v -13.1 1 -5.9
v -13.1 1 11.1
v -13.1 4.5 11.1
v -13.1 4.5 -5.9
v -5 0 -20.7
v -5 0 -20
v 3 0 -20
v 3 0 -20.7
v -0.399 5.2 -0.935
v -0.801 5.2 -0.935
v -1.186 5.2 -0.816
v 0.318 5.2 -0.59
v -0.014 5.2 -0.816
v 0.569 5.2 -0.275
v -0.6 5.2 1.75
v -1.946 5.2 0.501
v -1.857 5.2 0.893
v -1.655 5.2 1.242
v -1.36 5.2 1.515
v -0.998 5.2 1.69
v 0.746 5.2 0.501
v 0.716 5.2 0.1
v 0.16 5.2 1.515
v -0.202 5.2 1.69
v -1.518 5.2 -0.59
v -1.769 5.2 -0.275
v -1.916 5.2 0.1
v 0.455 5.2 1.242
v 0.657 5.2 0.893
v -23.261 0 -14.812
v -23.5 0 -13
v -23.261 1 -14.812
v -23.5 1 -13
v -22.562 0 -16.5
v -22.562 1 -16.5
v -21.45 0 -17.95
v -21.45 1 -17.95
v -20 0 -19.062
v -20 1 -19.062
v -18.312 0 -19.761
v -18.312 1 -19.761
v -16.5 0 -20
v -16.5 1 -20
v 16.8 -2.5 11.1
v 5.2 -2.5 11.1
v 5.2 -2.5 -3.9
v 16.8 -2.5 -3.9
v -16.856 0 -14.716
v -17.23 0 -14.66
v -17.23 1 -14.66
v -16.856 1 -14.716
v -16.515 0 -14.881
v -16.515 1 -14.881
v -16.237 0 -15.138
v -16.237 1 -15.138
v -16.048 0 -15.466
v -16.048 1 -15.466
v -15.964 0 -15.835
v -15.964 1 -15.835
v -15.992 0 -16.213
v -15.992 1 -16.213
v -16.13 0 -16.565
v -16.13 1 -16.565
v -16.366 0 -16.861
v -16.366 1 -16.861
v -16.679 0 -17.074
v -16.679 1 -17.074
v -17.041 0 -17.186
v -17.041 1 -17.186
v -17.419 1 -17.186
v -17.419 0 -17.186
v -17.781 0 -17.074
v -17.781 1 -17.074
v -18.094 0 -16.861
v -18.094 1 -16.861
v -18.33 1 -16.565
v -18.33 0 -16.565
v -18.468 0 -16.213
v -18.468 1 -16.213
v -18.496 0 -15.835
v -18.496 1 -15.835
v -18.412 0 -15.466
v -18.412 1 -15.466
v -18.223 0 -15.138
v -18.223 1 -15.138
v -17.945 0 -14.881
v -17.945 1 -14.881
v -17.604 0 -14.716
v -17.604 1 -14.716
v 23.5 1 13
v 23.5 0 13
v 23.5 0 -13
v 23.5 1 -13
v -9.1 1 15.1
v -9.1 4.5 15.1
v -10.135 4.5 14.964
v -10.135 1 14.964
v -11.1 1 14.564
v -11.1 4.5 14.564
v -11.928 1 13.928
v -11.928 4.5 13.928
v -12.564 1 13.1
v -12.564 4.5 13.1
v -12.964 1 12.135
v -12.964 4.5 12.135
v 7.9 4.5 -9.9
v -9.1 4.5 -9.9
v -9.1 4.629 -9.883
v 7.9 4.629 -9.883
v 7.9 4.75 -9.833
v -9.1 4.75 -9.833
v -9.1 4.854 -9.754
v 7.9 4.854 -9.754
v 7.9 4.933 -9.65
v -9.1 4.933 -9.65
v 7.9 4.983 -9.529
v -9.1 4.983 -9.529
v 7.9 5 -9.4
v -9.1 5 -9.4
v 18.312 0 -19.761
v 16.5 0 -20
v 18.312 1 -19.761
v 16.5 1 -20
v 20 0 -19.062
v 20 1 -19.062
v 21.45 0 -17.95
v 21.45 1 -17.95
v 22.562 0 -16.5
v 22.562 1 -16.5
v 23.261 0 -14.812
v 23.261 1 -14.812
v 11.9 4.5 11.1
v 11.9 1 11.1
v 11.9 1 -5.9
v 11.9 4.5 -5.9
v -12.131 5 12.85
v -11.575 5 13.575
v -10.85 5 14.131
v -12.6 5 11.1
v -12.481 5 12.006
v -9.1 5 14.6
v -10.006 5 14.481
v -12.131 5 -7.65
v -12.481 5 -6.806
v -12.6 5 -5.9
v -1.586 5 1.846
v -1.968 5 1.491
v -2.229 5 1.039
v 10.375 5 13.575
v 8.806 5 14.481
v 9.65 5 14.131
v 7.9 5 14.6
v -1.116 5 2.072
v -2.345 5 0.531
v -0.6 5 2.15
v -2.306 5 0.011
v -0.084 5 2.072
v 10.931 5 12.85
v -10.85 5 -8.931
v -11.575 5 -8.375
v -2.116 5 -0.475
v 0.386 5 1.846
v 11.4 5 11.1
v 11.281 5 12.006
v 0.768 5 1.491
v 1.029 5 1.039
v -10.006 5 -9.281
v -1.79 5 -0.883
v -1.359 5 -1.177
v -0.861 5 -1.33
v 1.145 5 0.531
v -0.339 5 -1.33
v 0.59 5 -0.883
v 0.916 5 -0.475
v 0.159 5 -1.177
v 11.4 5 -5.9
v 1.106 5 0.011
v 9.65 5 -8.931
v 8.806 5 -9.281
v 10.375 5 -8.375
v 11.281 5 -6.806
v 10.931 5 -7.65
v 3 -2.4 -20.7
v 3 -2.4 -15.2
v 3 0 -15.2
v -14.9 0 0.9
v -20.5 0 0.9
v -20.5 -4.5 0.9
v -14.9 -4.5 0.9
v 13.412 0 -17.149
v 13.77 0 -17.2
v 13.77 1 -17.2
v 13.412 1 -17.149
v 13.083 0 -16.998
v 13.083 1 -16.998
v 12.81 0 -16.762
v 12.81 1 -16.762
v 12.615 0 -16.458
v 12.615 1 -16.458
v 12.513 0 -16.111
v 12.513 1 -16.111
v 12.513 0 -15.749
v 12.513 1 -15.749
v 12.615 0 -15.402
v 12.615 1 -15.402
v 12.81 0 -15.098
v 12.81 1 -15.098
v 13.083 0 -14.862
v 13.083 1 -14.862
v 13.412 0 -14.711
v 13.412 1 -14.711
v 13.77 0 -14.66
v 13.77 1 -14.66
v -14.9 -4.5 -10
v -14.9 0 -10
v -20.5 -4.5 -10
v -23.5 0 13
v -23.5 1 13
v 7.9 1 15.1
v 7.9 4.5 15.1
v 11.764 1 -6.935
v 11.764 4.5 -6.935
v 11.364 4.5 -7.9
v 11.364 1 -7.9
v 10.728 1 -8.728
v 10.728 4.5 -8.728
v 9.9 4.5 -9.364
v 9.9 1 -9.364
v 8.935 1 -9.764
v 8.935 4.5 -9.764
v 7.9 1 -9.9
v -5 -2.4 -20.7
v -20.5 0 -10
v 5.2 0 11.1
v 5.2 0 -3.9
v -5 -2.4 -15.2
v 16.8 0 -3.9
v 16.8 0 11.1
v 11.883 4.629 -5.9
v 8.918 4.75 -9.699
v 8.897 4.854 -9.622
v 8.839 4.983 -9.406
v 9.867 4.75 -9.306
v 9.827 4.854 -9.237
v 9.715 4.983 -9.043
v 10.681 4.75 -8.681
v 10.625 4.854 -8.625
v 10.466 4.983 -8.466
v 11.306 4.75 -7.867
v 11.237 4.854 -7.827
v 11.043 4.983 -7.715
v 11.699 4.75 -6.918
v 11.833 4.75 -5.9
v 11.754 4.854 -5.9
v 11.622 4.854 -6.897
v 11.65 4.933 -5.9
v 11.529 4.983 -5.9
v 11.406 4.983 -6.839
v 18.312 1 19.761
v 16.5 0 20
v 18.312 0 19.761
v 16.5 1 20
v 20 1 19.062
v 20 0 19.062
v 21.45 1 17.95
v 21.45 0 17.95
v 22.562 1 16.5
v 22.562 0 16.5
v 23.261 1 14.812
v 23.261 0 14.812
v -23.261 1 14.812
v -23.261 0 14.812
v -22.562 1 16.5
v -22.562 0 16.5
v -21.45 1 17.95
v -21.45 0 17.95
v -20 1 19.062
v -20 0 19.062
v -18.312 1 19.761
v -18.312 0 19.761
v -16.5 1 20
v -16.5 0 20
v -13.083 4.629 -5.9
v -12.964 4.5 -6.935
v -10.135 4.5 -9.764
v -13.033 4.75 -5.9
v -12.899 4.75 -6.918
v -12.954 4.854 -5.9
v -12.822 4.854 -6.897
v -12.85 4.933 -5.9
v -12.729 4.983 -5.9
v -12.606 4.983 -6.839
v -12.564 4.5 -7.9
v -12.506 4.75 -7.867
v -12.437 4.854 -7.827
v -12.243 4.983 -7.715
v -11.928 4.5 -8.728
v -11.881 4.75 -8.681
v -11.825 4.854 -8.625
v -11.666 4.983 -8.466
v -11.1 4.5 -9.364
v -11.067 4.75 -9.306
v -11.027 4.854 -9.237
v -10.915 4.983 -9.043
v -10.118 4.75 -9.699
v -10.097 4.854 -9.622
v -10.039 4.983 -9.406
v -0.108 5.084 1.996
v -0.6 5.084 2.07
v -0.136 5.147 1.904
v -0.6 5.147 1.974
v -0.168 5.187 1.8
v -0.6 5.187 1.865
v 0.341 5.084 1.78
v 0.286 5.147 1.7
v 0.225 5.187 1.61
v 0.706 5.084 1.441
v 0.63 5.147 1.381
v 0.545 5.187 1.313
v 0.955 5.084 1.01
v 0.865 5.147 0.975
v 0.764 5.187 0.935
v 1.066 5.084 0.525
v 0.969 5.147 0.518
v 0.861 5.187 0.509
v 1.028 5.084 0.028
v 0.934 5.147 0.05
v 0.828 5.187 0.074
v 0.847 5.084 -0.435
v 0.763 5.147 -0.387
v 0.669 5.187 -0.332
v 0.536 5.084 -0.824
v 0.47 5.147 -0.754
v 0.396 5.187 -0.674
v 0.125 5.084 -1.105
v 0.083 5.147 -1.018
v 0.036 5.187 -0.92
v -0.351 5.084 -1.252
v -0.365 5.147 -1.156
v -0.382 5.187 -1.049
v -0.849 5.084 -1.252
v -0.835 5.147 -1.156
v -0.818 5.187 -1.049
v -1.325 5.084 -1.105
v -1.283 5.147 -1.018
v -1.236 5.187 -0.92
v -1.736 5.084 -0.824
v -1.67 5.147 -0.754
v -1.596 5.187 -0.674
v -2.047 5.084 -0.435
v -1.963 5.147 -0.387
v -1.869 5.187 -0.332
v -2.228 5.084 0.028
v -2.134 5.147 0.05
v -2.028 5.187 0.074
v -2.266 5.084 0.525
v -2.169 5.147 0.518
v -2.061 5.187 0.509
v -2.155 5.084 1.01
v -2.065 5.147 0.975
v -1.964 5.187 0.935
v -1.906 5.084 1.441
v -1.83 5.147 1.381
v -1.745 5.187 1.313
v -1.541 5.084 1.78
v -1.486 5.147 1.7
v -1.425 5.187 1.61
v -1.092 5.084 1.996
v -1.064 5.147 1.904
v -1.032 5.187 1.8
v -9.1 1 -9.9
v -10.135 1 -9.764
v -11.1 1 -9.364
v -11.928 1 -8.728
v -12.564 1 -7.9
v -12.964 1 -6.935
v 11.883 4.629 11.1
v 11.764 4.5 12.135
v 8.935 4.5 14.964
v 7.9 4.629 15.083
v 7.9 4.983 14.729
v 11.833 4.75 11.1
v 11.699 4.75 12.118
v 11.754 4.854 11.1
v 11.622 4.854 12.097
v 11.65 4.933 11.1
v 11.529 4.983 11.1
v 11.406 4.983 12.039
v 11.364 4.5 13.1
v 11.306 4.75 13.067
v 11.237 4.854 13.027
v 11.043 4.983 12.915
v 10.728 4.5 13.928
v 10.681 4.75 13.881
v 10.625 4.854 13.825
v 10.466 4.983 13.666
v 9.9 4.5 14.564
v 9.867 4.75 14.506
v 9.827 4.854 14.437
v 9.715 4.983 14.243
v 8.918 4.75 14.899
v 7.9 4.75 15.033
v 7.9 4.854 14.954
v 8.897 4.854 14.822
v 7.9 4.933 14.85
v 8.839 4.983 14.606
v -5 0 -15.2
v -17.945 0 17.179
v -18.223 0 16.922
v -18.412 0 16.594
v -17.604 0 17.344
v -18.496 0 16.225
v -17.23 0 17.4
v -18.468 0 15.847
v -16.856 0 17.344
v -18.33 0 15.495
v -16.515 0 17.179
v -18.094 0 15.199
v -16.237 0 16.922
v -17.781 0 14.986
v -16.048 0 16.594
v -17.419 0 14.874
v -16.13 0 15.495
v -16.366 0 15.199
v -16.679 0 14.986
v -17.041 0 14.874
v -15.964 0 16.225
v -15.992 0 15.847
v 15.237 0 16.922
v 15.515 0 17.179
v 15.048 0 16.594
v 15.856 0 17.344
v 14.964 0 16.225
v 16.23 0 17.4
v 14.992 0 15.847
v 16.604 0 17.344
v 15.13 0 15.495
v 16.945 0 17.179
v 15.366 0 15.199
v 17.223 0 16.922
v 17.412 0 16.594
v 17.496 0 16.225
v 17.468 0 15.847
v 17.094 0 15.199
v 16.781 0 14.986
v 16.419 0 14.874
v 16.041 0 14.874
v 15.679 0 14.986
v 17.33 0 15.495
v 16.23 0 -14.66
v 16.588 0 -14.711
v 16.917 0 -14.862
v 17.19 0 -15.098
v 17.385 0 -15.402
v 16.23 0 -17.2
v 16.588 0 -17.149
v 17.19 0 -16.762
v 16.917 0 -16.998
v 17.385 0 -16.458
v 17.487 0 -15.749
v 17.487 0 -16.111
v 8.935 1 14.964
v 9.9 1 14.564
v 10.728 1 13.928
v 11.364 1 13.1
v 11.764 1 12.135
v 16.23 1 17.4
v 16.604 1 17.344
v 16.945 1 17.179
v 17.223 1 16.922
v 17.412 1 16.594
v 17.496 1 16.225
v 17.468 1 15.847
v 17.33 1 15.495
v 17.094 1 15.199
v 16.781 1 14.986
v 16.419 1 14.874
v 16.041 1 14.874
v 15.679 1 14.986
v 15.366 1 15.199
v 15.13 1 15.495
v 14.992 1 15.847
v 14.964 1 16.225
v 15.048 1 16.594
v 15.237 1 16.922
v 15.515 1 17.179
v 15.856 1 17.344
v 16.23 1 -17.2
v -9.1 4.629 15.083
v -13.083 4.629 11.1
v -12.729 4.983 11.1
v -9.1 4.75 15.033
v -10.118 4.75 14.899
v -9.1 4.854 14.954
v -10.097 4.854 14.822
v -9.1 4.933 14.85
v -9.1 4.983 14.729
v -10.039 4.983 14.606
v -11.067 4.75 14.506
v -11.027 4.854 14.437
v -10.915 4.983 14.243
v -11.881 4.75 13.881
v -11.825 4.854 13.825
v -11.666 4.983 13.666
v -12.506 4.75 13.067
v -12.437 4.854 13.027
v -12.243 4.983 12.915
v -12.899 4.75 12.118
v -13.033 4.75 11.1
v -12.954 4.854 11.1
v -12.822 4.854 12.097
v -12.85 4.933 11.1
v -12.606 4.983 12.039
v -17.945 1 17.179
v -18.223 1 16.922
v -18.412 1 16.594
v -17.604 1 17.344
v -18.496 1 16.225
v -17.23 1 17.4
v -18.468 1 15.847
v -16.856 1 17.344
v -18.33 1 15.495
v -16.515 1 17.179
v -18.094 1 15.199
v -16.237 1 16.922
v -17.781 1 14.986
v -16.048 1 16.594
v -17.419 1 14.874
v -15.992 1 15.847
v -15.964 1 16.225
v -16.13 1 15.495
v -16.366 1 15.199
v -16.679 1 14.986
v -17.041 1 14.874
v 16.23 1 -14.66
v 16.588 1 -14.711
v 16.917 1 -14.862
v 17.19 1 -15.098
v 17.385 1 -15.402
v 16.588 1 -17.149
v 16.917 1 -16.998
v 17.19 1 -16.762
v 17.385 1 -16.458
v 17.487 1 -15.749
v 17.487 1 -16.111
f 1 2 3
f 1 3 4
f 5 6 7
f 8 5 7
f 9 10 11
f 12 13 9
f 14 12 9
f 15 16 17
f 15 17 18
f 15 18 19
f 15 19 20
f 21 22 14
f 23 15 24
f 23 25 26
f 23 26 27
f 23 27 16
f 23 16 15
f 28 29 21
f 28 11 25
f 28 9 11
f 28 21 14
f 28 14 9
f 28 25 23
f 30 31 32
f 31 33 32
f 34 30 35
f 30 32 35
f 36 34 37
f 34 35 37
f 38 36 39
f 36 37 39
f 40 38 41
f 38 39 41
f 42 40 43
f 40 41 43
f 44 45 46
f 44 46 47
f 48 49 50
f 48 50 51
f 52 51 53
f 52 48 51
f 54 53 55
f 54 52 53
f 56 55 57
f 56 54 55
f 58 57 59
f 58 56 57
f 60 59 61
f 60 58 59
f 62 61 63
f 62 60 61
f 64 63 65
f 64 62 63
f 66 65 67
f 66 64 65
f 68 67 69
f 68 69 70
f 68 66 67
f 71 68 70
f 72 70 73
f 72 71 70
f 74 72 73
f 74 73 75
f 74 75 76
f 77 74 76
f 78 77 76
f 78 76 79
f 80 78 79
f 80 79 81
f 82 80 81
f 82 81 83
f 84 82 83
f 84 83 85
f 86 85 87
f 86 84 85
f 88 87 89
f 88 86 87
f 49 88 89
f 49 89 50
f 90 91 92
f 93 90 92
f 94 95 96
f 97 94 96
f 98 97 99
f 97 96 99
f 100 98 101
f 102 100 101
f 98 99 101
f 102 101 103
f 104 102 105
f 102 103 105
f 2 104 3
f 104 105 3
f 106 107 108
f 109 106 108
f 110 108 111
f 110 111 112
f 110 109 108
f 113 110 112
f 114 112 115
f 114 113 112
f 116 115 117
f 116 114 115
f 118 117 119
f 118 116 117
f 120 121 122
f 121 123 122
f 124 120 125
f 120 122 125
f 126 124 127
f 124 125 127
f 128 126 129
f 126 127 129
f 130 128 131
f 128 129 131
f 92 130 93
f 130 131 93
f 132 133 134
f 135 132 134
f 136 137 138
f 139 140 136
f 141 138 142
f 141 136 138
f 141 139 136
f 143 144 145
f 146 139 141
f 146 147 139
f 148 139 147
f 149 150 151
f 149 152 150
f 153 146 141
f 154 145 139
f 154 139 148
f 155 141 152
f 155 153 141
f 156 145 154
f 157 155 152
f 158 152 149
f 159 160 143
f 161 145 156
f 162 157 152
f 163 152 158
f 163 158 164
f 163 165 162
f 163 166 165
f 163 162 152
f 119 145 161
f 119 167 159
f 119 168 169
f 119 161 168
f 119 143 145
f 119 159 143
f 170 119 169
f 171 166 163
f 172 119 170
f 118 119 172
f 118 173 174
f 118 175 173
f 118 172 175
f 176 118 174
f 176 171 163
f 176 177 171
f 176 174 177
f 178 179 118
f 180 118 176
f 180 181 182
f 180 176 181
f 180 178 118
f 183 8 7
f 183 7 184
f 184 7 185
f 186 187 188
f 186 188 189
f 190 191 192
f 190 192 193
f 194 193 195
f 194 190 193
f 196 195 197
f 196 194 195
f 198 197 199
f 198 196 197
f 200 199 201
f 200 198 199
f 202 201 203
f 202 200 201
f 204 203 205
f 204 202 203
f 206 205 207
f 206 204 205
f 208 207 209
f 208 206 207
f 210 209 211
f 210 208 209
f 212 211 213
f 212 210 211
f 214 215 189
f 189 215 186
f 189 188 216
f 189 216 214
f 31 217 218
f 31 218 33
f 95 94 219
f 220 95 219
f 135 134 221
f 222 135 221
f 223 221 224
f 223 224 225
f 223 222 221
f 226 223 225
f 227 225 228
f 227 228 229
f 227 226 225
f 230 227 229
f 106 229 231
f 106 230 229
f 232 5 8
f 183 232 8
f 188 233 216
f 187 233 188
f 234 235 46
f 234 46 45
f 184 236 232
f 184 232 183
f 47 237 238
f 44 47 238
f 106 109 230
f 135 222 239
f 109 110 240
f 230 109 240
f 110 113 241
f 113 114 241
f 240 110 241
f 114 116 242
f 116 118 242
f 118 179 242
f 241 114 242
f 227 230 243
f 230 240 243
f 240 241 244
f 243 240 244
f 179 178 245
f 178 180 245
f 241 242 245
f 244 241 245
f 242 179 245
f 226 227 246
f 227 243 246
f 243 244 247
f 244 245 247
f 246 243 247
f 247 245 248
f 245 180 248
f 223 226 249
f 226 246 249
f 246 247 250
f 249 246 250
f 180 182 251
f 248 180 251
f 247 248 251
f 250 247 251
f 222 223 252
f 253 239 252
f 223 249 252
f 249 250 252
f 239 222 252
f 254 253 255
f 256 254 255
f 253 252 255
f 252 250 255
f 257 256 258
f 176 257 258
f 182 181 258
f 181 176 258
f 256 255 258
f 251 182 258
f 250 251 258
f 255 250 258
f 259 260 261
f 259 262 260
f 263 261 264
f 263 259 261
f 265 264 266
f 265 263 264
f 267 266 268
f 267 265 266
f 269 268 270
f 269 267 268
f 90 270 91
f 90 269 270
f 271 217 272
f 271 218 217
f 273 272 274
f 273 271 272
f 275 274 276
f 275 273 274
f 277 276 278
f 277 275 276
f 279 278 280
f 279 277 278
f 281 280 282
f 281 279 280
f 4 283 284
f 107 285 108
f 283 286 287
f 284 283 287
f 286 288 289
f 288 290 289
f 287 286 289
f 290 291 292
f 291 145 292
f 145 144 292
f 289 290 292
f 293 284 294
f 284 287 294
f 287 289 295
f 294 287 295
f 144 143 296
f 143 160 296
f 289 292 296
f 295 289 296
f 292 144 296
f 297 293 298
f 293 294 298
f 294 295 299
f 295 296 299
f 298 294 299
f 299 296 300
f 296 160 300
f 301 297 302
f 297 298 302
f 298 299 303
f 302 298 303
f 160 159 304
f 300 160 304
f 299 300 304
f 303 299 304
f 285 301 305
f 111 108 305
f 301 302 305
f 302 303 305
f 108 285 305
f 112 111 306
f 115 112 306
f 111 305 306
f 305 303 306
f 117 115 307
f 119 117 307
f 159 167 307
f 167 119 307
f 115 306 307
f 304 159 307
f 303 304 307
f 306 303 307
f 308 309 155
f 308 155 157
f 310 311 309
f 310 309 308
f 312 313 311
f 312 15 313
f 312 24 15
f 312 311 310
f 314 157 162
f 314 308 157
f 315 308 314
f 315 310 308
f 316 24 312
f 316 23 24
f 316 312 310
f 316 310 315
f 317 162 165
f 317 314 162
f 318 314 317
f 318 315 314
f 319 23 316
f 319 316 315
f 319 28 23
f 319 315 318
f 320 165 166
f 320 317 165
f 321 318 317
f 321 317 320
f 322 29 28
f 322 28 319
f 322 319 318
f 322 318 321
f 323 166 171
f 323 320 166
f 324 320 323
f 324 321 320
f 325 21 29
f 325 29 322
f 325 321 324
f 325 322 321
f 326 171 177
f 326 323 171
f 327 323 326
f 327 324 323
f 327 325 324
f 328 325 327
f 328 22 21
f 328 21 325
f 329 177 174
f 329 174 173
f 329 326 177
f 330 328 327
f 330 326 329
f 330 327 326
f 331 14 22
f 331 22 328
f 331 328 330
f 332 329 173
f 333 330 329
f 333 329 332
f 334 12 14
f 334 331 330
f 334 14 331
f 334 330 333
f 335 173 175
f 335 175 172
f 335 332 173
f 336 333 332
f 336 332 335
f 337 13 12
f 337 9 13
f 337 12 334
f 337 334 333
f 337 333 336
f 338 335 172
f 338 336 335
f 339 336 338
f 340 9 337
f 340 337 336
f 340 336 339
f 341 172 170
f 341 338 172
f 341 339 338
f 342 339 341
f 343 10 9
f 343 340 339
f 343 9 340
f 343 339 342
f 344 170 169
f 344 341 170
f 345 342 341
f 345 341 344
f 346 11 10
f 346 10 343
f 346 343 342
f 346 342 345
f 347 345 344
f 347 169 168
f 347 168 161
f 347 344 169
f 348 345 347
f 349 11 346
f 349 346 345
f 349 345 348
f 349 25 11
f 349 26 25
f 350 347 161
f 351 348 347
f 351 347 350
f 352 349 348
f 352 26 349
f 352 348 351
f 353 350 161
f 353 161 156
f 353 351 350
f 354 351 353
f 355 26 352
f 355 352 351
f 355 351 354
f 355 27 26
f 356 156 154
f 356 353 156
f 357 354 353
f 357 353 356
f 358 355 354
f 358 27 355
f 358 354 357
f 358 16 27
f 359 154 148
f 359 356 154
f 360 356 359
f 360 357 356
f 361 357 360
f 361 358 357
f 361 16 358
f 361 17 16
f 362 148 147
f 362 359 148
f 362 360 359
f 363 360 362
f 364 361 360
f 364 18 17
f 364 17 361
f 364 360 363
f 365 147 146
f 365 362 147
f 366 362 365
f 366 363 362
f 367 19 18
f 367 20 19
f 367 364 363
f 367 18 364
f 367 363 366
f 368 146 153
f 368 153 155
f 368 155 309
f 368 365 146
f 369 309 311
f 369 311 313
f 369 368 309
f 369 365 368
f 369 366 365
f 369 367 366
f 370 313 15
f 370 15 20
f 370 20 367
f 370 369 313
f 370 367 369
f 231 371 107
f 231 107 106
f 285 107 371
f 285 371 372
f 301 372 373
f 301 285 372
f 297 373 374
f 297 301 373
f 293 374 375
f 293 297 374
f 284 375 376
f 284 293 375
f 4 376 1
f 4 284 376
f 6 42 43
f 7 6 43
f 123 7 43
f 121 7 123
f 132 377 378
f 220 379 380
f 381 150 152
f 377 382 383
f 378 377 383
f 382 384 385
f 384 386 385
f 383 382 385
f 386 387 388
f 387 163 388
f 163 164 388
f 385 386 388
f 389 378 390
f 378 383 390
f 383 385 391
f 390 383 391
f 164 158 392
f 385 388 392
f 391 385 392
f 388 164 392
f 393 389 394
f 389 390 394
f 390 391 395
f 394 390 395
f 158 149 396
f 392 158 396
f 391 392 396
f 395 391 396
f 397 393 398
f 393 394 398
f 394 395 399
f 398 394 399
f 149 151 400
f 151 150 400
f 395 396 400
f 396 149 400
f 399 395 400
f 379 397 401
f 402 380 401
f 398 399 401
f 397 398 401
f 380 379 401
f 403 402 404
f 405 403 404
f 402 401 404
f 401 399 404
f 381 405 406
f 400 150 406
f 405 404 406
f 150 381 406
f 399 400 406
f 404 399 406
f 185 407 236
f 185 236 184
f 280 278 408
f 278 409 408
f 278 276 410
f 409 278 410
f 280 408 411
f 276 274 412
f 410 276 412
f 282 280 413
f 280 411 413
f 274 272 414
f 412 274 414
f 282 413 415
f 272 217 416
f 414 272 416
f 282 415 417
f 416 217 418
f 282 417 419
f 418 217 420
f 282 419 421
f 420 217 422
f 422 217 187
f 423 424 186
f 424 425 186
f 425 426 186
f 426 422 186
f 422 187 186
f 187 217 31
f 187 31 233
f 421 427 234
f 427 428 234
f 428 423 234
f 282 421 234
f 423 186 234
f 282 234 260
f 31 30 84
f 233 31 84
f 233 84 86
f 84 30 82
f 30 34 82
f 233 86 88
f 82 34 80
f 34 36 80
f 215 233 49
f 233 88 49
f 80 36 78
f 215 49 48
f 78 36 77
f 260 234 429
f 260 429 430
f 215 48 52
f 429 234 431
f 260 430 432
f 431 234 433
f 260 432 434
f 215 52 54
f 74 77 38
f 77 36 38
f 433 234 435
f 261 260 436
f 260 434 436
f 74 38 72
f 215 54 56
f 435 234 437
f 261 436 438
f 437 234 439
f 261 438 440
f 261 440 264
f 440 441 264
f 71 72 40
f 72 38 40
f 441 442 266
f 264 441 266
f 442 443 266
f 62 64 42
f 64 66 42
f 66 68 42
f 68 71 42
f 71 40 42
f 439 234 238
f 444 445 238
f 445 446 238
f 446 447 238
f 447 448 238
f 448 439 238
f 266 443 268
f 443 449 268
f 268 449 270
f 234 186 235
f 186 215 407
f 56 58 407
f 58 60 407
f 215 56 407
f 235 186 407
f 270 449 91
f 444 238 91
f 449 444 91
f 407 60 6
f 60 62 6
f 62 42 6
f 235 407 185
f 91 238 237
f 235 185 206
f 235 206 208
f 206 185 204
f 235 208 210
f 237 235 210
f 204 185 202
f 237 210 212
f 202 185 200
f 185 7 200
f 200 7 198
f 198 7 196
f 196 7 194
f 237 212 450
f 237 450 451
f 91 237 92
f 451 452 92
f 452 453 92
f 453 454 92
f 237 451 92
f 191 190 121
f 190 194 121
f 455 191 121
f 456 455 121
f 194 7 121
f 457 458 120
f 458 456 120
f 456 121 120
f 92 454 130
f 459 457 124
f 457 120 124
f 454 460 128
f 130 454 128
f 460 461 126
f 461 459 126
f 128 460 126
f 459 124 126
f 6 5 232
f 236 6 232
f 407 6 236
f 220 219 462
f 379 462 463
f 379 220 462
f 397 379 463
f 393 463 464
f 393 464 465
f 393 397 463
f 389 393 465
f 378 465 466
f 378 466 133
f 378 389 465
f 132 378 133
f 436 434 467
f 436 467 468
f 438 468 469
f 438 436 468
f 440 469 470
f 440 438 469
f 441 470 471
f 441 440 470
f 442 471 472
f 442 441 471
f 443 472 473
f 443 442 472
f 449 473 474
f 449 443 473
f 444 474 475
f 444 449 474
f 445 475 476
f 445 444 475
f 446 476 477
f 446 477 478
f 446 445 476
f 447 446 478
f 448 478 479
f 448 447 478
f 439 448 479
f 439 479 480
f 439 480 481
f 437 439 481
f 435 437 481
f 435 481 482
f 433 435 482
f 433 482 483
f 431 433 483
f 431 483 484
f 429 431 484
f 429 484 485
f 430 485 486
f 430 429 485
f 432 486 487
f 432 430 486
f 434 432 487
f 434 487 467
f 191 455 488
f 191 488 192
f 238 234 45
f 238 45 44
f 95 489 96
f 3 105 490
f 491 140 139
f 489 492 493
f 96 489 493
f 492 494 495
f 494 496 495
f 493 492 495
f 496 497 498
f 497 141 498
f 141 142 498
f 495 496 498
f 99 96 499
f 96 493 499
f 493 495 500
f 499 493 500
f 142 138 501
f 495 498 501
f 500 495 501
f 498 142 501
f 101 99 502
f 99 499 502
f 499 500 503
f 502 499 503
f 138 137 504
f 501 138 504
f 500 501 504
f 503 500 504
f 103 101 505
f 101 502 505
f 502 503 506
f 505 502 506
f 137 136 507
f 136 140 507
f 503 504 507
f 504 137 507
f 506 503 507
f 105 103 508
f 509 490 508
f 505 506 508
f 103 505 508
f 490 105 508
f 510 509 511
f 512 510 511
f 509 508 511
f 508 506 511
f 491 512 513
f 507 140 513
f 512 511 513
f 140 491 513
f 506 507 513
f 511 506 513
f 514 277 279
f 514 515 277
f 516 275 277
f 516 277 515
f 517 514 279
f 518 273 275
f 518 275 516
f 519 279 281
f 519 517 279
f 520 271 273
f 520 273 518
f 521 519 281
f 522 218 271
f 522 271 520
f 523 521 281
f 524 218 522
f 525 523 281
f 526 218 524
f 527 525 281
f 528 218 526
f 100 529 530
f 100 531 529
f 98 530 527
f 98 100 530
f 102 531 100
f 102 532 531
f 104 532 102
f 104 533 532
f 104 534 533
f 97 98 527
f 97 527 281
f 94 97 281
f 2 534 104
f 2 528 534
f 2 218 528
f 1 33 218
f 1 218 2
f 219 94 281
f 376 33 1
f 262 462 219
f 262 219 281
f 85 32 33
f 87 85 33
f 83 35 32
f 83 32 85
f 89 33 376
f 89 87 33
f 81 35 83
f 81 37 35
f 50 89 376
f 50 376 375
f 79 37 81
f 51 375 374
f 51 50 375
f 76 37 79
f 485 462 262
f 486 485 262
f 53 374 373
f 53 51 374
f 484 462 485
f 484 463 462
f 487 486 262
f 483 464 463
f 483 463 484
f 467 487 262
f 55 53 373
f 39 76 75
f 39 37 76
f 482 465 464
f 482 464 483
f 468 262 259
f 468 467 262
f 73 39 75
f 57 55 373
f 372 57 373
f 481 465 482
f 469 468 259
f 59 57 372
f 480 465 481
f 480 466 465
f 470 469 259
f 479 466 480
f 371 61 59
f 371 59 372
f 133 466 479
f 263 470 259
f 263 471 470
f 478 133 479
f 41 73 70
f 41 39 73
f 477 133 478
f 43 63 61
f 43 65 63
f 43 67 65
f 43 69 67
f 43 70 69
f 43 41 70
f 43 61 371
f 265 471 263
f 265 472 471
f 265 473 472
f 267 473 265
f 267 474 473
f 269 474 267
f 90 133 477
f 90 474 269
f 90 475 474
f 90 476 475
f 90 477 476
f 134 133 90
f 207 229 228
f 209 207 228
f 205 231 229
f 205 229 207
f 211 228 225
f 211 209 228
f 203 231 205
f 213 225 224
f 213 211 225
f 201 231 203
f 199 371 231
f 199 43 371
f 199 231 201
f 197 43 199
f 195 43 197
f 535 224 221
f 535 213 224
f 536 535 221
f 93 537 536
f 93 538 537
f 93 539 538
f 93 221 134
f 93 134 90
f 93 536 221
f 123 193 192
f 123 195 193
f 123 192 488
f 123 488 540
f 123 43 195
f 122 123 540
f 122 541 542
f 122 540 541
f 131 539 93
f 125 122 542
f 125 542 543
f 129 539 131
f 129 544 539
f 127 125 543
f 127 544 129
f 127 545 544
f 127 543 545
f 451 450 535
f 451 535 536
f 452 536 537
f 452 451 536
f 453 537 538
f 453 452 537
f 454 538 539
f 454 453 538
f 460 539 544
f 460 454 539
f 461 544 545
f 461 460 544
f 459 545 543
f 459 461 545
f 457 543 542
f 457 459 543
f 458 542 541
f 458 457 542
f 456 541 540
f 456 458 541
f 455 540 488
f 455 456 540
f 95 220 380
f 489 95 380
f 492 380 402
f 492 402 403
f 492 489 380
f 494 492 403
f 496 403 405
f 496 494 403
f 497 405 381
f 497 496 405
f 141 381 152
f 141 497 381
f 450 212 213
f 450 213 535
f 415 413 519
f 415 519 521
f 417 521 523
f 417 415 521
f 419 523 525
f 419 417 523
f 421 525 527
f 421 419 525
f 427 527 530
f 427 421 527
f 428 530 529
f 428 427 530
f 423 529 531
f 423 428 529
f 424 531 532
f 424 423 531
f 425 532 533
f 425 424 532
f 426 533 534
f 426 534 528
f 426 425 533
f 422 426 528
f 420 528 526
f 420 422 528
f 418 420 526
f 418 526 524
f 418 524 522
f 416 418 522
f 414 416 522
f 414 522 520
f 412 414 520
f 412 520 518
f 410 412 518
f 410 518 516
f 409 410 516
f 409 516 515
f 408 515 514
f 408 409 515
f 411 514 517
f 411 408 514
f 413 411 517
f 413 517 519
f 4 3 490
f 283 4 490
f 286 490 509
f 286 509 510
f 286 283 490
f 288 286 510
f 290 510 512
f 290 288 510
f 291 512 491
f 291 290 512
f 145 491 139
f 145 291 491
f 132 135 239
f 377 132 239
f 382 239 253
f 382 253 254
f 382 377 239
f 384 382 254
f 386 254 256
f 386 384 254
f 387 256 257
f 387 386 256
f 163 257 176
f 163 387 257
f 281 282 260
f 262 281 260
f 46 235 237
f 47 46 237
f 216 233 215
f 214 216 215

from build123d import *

# Parameters (mm, degrees)
SKETCH4_W           = 47
SKETCH4_H           = 40
SKETCH4_R           = 1.27
BOSS_EXTRUDE1_DEPTH = 1
FILLET1_R           = 7
SKETCH5_W           = 11.6
SKETCH5_H           = 15
BOSS_EXTRUDE2_DEPTH = 2.5
SKETCH6_W           = 5.6
SKETCH6_H           = 10.9
BOSS_EXTRUDE3_DEPTH = 4.5
SKETCH7_W           = 25
SKETCH7_H           = 25
BOSS_EXTRUDE4_DEPTH = 4
FILLET2_R           = 4
SKETCH8_R           = 1.75
BOSS_EXTRUDE5_DEPTH = 0.2
FILLET3_R           = 0.5
SKETCH9_W           = 8
SKETCH9_H           = 5.5
BOSS_EXTRUDE6_DEPTH = 2.4
FILLET4_R           = 0.5


with BuildPart() as part:
    # Sketch4 → Boss-Extrude1 (new body)
    with BuildSketch(Plane(origin=(0, 0, 0), x_dir=(1, 0, 0), z_dir=(0, 1, 0))):
        Rectangle(SKETCH4_W, SKETCH4_H)
        with Locations(Location((16.23, -16.13, 0), (0, 0, 270))):
            Circle(SKETCH4_R, mode=Mode.SUBTRACT)
        with Locations(Location((-17.23, -16.13, 0), (0, 0, 270))):
            Circle(SKETCH4_R, mode=Mode.SUBTRACT)
        with Locations(Location((-17.23, 15.93, 0), (0, 0, 270))):
            Circle(SKETCH4_R, mode=Mode.SUBTRACT)
        with BuildLine():
            Line((13.77, 14.66), (16.23, 14.66))
            ThreePointArc((16.23, 14.66), (17.5, 15.93), (16.23, 17.2))
            Line((16.23, 17.2), (13.77, 17.2))
            ThreePointArc((13.77, 17.2), (12.5, 15.93), (13.77, 14.66))
        make_face(mode=Mode.SUBTRACT)
    extrude(amount=BOSS_EXTRUDE1_DEPTH)

    # Fillet1
    fillet1_edges = [part.edges().sort_by_distance(p)[0] for p in [
        (23.5, 0.5, -20),
        (23.5, 0.5, 20),
        (-23.5, 0.5, 20),
        (-23.5, 0.5, -20),
    ]]
    fillet(fillet1_edges, radius=FILLET1_R)

    # Sketch5 → Boss-Extrude2 (add)
    with BuildSketch(Plane.XZ):
        with Locations((11, 3.6)):
            Rectangle(SKETCH5_W, SKETCH5_H)
    extrude(amount=BOSS_EXTRUDE2_DEPTH)

    # Sketch6 → Boss-Extrude3 (add)
    with BuildSketch(Plane.XZ):
        with Locations((-17.7, -4.55)):
            Rectangle(SKETCH6_W, SKETCH6_H)
    extrude(amount=BOSS_EXTRUDE3_DEPTH)

    # Sketch7 → Boss-Extrude4 (add)
    with BuildSketch(Plane(origin=(0, 1, 0), x_dir=(1, 0, 0), z_dir=(0, 1, 0))):
        with Locations((-0.6, -2.6)):
            Rectangle(SKETCH7_W, SKETCH7_H)
    extrude(amount=BOSS_EXTRUDE4_DEPTH)

    # Fillet2
    fillet2_edges = [part.edges().sort_by_distance(p)[0] for p in [
        (-13.1, 3, -9.9),
        (-13.1, 3, 15.1),
        (11.9, 3, 15.1),
        (11.9, 3, -9.9),
    ]]
    fillet(fillet2_edges, radius=FILLET2_R)

    # Sketch8 → Boss-Extrude5 (add)
    with BuildSketch(Plane(origin=(0, 5, 0), x_dir=(1, 0, 0), z_dir=(0, 1, 0))):
        with Locations(Location((-0.6, -0.4, 0), (0, 0, 270))):
            Circle(SKETCH8_R)
    extrude(amount=BOSS_EXTRUDE5_DEPTH)

    # Fillet3
    # the kernel refuses this fillet: 0.5 mm, written as the material it takes off along each edge
    with BuildSketch(Plane(origin=(-0.6, 5.2, 0.4), x_dir=(0, 0, 1), z_dir=(-1, 0, 0))) as fillet3_piece_1:
        with BuildLine():
            CenterArc((1.35, -0.5), FILLET3_R, 36.869897645, 53.130102355)
            Line((1.35, 0), (1.35, 0.01))
            Line((1.35, 0.01), (1.75, 0.01))
            Line((1.75, 0.01), (1.76, 0))
            ThreePointArc((1.76, 0), (1.76, -0.1), (1.758, -0.194))
            Line((1.758, -0.194), (1.75, -0.2))
        make_face()
    revolve(axis=Axis((-0.6, 5.2, 0.4), (0, 1, 0)), mode=Mode.SUBTRACT)

    # Sketch9 → Boss-Extrude6 (add)
    with BuildSketch(Plane.XZ):
        with Locations((-1, -17.95)):
            Rectangle(SKETCH9_W, SKETCH9_H)
    extrude(amount=BOSS_EXTRUDE6_DEPTH)

    # Fillet4
    fillet4_edges = [part.edges().sort_by_distance(p)[0] for p in [
        (-13.1, 5, 2.6),
        (-0.6, 5, -9.9),
        (-0.6, 5, 15.1),
        (11.9, 5, 2.6),
        (10.728427125, 5, -8.728427125),
        (10.728427125, 5, 13.928427125),
        (-11.928427125, 5, 13.928427125),
        (-11.928427125, 5, -8.728427125),
    ]]
    fillet(fillet4_edges, radius=FILLET4_R)


solid = part.part
